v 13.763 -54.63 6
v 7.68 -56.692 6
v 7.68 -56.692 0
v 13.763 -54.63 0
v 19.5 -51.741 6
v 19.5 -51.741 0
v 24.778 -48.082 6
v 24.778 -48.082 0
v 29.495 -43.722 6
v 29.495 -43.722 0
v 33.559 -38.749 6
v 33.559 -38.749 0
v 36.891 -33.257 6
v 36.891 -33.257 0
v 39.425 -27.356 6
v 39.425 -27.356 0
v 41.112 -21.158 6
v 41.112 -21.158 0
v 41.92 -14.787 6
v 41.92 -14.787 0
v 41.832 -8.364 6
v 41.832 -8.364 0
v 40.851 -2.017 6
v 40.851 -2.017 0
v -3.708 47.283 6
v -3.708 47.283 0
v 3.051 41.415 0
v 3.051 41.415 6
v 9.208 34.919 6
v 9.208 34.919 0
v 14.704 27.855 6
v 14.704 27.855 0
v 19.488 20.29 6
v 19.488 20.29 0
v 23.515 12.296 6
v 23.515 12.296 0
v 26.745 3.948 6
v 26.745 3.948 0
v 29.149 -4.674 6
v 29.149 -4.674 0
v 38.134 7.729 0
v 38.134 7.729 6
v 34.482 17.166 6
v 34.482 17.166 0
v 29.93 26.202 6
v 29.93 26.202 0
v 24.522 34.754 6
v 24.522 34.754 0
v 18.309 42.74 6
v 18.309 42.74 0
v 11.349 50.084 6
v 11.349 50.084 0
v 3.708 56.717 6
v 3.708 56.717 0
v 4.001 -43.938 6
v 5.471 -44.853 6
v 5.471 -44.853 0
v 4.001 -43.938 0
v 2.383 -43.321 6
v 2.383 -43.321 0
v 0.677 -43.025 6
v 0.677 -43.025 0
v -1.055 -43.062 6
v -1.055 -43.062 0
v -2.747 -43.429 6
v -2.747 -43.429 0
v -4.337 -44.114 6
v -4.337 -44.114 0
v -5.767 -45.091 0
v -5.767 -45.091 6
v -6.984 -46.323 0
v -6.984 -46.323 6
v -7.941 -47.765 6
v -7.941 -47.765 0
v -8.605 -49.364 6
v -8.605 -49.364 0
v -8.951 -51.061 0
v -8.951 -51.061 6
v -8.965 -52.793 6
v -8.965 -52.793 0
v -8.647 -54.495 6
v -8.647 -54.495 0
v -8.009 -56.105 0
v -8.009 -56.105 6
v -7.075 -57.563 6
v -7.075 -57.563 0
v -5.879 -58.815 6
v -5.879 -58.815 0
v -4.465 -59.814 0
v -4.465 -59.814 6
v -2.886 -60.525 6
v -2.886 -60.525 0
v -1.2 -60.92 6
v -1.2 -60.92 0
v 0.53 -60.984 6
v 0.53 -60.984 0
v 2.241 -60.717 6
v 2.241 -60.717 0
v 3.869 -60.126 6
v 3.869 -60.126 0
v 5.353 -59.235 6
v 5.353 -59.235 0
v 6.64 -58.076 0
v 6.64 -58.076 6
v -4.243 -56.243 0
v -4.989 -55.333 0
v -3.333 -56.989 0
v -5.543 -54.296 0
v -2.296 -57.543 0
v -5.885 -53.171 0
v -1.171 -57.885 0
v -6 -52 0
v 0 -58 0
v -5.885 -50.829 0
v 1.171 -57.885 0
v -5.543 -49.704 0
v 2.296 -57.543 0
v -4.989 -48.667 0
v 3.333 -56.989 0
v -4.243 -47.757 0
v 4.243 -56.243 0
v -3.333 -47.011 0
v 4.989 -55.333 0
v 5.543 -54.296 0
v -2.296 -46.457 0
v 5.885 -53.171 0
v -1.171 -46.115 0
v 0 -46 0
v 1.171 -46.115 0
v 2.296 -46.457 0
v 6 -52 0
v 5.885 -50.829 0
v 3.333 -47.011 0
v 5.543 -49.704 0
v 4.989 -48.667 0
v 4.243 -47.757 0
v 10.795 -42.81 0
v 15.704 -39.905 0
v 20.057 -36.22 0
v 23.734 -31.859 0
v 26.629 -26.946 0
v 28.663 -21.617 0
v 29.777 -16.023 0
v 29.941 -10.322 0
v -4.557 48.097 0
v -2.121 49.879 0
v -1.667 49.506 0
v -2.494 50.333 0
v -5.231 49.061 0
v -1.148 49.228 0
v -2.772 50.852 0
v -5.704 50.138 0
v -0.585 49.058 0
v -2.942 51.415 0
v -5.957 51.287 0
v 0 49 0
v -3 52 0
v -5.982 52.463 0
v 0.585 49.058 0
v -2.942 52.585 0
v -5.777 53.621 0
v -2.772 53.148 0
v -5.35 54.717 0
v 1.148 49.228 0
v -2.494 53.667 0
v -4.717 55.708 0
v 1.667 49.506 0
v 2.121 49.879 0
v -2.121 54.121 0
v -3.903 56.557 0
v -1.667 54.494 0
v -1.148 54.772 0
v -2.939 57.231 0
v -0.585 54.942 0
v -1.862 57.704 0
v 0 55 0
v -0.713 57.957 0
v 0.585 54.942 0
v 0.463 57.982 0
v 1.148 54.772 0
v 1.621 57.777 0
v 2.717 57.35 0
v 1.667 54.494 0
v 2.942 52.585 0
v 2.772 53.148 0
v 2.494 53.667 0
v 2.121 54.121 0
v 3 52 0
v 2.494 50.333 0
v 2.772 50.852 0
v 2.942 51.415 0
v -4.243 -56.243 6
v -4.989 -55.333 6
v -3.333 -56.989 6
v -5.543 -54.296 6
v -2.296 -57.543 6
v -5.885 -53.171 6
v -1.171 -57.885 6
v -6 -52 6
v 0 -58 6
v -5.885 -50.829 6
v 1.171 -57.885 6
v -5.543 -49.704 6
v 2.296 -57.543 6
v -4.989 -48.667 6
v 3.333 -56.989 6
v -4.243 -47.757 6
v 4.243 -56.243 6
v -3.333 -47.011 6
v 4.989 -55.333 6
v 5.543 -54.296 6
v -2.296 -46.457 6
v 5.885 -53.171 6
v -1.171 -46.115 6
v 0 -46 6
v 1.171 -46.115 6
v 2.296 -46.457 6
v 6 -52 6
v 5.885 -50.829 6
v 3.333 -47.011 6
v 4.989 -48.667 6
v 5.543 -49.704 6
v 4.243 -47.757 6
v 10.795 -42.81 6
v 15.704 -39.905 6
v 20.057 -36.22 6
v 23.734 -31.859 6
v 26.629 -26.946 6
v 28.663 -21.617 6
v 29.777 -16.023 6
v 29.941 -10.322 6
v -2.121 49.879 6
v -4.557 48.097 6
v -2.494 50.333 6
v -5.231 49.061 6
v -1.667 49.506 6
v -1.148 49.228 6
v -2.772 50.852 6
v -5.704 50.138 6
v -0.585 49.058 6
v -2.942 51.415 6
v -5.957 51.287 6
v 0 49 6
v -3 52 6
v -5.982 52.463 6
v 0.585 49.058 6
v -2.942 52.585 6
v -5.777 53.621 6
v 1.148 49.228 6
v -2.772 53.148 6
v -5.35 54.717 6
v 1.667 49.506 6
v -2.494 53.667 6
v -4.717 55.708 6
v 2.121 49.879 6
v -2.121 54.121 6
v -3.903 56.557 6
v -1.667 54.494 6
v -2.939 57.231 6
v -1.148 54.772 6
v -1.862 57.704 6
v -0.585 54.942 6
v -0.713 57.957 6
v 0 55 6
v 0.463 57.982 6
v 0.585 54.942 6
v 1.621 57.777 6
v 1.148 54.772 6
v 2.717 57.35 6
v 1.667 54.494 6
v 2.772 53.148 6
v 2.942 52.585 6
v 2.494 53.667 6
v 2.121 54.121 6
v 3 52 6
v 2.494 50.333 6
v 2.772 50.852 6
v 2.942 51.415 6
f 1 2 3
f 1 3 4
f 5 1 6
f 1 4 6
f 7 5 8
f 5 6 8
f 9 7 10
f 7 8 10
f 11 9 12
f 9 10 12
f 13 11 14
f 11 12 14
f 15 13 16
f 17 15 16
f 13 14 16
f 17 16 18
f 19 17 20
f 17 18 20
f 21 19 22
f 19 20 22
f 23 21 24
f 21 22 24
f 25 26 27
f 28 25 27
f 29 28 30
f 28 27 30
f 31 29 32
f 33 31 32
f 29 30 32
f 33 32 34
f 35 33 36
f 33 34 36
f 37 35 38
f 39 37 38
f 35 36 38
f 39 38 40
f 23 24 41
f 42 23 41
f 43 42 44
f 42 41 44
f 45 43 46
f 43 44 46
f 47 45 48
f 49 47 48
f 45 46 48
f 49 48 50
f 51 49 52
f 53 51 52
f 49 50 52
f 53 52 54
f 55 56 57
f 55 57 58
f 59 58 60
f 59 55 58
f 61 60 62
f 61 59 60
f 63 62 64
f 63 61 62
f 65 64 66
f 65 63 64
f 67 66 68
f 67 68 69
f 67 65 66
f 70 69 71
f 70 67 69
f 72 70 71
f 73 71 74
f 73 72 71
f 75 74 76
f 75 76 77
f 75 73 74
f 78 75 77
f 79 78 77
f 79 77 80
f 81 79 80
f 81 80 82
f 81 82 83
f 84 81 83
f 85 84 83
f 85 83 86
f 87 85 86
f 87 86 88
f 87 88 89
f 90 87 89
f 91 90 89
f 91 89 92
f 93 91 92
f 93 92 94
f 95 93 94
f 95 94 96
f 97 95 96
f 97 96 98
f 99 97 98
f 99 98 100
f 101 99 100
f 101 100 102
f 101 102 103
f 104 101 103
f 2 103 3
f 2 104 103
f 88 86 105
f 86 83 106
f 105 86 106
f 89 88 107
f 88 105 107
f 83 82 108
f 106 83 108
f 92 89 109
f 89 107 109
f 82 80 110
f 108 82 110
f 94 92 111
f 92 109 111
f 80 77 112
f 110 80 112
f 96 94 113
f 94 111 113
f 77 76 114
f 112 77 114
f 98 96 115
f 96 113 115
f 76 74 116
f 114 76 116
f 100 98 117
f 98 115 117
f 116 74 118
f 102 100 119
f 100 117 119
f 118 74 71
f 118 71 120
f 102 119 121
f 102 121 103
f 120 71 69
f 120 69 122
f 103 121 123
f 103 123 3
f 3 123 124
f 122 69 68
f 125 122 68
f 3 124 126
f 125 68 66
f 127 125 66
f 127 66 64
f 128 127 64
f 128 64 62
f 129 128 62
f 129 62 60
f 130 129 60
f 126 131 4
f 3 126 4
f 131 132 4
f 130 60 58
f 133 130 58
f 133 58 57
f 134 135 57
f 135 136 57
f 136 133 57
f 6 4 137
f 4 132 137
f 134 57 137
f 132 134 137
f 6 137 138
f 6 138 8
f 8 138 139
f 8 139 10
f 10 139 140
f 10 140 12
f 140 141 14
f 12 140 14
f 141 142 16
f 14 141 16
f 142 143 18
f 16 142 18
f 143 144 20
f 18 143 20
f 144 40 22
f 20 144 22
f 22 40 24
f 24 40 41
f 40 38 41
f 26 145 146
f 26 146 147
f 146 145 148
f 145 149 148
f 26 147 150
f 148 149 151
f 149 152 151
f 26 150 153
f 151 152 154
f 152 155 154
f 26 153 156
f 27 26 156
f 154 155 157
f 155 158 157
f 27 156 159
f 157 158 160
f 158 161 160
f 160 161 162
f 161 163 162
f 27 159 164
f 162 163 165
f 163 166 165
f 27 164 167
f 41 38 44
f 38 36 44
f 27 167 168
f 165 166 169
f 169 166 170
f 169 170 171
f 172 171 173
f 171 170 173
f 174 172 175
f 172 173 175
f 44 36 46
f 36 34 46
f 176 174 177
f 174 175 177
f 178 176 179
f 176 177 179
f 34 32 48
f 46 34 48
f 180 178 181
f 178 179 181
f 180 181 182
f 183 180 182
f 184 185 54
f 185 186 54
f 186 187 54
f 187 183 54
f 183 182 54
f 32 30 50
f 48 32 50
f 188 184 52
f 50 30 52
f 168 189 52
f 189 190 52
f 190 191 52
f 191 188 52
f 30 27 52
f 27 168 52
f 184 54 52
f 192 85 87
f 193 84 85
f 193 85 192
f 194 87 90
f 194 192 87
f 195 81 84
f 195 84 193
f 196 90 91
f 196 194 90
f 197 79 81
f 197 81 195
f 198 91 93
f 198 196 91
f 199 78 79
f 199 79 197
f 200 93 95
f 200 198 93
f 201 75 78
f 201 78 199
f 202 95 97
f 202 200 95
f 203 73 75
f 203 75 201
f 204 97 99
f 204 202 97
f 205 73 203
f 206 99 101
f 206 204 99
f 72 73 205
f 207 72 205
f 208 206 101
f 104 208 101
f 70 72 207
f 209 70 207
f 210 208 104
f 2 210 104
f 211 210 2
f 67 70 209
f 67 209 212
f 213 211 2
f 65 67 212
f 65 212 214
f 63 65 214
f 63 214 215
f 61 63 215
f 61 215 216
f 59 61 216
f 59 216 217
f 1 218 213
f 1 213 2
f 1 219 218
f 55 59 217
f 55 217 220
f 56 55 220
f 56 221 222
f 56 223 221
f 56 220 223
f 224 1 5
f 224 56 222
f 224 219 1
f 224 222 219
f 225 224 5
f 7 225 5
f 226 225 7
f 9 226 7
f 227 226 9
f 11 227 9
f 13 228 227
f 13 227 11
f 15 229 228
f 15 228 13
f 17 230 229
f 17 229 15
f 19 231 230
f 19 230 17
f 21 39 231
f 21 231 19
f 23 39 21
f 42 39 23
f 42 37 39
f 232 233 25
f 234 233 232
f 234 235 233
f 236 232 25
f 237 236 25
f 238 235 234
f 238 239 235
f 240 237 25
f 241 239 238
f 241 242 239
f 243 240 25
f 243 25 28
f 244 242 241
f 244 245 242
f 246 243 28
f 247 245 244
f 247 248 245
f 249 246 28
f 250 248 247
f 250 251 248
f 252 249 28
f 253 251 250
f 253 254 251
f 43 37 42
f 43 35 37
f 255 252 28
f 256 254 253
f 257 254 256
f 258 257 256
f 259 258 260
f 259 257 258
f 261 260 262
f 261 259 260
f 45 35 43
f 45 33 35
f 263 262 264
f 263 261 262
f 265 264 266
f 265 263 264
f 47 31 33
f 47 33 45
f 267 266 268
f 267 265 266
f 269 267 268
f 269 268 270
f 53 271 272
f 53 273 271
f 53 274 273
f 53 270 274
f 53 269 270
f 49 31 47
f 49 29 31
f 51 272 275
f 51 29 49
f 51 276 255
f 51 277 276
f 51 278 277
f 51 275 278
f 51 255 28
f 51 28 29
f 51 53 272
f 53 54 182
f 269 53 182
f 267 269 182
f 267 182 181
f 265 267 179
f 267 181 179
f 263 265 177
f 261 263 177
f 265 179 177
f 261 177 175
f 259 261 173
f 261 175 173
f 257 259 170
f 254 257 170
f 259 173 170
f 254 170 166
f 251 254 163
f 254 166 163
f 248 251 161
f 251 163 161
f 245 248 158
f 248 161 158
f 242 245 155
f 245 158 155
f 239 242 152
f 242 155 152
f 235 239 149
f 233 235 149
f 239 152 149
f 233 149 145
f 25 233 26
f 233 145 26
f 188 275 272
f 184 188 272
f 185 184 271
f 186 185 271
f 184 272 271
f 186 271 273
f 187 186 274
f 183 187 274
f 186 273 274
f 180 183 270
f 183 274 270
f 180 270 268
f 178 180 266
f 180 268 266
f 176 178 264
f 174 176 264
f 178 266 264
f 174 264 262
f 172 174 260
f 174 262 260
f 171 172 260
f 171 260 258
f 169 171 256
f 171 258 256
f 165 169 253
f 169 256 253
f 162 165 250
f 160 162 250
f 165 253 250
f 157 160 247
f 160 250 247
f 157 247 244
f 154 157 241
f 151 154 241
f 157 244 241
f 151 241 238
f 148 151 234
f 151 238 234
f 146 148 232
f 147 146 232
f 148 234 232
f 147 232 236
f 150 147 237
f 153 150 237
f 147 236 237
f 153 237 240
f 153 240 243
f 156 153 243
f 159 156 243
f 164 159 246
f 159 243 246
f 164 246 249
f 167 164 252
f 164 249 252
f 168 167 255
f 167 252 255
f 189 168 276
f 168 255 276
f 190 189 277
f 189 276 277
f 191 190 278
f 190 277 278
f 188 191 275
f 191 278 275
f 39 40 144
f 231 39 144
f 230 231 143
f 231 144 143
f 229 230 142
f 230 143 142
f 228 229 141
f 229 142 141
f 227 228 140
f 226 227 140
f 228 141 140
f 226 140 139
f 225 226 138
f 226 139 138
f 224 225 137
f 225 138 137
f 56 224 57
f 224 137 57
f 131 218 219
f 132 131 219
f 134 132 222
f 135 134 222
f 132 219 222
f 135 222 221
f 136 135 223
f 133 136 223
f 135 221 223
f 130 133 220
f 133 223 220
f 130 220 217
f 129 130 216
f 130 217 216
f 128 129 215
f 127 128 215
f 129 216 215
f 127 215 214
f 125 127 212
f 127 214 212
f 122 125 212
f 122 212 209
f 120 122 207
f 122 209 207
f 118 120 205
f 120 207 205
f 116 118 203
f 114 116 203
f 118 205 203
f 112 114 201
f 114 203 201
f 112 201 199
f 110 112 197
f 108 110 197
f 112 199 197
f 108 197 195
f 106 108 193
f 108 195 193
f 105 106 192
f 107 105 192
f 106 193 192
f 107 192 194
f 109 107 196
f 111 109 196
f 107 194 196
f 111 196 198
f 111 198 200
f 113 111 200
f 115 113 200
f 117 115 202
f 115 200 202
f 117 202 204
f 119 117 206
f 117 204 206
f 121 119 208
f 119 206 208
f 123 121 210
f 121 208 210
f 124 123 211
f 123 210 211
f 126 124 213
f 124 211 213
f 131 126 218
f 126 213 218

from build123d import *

# Parameters (mm, degrees)
EXTRUDE_1_DEPTH     = 6
SKETCH_2_R          = 9
EXTRUDE_2_DEPTH     = 6
SKETCH_3_R          = 6
SKETCH_3_R_2        = 3
CUT_EXTRUDE_1_DEPTH = 6


with BuildPart() as part:
    # 草图1 → 凸台-拉伸1 (new body)
    with BuildSketch(Plane.XY):
        with BuildLine():
            ThreePointArc((0.601101389, -57.969813826), (33.334648413, -39.063402424), (40.851101389, -2.016939333))
            ThreePointArc((40.851101389, -2.016939333), (27.330534013, 30.544098151), (3.708244246, 56.716876574))
            ThreePointArc((3.708244246, 56.716876574), (-4.716876574, 55.708244246), (-3.708244246, 47.283123426))
            ThreePointArc((-3.708244246, 47.283123426), (17.188396702, 24.130280975), (29.148898611, -4.673713722))
            ThreePointArc((29.148898611, -4.673713722), (23.593259455, -32.055882093), (-0.601101389, -46.030186174))
            ThreePointArc((-0.601101389, -46.030186174), (-5.969813826, -52.601101389), (0.601101389, -57.969813826))
        make_face()
    extrude(amount=EXTRUDE_1_DEPTH)

    # 草图2 → 凸台-拉伸2 (add)
    with BuildSketch(Plane.XY.offset(6)):
        with Locations((0, -52)):
            Circle(SKETCH_2_R)
    extrude(amount=-EXTRUDE_2_DEPTH)

    # 草图3 → 切除-拉伸1 (cut)
    with BuildSketch(Plane.XY.offset(6)):
        with Locations((0, -52)):
            Circle(SKETCH_3_R)
        with Locations((0, 52)):
            Circle(SKETCH_3_R_2)
    extrude(amount=-CUT_EXTRUDE_1_DEPTH, mode=Mode.SUBTRACT)


solid = part.part
